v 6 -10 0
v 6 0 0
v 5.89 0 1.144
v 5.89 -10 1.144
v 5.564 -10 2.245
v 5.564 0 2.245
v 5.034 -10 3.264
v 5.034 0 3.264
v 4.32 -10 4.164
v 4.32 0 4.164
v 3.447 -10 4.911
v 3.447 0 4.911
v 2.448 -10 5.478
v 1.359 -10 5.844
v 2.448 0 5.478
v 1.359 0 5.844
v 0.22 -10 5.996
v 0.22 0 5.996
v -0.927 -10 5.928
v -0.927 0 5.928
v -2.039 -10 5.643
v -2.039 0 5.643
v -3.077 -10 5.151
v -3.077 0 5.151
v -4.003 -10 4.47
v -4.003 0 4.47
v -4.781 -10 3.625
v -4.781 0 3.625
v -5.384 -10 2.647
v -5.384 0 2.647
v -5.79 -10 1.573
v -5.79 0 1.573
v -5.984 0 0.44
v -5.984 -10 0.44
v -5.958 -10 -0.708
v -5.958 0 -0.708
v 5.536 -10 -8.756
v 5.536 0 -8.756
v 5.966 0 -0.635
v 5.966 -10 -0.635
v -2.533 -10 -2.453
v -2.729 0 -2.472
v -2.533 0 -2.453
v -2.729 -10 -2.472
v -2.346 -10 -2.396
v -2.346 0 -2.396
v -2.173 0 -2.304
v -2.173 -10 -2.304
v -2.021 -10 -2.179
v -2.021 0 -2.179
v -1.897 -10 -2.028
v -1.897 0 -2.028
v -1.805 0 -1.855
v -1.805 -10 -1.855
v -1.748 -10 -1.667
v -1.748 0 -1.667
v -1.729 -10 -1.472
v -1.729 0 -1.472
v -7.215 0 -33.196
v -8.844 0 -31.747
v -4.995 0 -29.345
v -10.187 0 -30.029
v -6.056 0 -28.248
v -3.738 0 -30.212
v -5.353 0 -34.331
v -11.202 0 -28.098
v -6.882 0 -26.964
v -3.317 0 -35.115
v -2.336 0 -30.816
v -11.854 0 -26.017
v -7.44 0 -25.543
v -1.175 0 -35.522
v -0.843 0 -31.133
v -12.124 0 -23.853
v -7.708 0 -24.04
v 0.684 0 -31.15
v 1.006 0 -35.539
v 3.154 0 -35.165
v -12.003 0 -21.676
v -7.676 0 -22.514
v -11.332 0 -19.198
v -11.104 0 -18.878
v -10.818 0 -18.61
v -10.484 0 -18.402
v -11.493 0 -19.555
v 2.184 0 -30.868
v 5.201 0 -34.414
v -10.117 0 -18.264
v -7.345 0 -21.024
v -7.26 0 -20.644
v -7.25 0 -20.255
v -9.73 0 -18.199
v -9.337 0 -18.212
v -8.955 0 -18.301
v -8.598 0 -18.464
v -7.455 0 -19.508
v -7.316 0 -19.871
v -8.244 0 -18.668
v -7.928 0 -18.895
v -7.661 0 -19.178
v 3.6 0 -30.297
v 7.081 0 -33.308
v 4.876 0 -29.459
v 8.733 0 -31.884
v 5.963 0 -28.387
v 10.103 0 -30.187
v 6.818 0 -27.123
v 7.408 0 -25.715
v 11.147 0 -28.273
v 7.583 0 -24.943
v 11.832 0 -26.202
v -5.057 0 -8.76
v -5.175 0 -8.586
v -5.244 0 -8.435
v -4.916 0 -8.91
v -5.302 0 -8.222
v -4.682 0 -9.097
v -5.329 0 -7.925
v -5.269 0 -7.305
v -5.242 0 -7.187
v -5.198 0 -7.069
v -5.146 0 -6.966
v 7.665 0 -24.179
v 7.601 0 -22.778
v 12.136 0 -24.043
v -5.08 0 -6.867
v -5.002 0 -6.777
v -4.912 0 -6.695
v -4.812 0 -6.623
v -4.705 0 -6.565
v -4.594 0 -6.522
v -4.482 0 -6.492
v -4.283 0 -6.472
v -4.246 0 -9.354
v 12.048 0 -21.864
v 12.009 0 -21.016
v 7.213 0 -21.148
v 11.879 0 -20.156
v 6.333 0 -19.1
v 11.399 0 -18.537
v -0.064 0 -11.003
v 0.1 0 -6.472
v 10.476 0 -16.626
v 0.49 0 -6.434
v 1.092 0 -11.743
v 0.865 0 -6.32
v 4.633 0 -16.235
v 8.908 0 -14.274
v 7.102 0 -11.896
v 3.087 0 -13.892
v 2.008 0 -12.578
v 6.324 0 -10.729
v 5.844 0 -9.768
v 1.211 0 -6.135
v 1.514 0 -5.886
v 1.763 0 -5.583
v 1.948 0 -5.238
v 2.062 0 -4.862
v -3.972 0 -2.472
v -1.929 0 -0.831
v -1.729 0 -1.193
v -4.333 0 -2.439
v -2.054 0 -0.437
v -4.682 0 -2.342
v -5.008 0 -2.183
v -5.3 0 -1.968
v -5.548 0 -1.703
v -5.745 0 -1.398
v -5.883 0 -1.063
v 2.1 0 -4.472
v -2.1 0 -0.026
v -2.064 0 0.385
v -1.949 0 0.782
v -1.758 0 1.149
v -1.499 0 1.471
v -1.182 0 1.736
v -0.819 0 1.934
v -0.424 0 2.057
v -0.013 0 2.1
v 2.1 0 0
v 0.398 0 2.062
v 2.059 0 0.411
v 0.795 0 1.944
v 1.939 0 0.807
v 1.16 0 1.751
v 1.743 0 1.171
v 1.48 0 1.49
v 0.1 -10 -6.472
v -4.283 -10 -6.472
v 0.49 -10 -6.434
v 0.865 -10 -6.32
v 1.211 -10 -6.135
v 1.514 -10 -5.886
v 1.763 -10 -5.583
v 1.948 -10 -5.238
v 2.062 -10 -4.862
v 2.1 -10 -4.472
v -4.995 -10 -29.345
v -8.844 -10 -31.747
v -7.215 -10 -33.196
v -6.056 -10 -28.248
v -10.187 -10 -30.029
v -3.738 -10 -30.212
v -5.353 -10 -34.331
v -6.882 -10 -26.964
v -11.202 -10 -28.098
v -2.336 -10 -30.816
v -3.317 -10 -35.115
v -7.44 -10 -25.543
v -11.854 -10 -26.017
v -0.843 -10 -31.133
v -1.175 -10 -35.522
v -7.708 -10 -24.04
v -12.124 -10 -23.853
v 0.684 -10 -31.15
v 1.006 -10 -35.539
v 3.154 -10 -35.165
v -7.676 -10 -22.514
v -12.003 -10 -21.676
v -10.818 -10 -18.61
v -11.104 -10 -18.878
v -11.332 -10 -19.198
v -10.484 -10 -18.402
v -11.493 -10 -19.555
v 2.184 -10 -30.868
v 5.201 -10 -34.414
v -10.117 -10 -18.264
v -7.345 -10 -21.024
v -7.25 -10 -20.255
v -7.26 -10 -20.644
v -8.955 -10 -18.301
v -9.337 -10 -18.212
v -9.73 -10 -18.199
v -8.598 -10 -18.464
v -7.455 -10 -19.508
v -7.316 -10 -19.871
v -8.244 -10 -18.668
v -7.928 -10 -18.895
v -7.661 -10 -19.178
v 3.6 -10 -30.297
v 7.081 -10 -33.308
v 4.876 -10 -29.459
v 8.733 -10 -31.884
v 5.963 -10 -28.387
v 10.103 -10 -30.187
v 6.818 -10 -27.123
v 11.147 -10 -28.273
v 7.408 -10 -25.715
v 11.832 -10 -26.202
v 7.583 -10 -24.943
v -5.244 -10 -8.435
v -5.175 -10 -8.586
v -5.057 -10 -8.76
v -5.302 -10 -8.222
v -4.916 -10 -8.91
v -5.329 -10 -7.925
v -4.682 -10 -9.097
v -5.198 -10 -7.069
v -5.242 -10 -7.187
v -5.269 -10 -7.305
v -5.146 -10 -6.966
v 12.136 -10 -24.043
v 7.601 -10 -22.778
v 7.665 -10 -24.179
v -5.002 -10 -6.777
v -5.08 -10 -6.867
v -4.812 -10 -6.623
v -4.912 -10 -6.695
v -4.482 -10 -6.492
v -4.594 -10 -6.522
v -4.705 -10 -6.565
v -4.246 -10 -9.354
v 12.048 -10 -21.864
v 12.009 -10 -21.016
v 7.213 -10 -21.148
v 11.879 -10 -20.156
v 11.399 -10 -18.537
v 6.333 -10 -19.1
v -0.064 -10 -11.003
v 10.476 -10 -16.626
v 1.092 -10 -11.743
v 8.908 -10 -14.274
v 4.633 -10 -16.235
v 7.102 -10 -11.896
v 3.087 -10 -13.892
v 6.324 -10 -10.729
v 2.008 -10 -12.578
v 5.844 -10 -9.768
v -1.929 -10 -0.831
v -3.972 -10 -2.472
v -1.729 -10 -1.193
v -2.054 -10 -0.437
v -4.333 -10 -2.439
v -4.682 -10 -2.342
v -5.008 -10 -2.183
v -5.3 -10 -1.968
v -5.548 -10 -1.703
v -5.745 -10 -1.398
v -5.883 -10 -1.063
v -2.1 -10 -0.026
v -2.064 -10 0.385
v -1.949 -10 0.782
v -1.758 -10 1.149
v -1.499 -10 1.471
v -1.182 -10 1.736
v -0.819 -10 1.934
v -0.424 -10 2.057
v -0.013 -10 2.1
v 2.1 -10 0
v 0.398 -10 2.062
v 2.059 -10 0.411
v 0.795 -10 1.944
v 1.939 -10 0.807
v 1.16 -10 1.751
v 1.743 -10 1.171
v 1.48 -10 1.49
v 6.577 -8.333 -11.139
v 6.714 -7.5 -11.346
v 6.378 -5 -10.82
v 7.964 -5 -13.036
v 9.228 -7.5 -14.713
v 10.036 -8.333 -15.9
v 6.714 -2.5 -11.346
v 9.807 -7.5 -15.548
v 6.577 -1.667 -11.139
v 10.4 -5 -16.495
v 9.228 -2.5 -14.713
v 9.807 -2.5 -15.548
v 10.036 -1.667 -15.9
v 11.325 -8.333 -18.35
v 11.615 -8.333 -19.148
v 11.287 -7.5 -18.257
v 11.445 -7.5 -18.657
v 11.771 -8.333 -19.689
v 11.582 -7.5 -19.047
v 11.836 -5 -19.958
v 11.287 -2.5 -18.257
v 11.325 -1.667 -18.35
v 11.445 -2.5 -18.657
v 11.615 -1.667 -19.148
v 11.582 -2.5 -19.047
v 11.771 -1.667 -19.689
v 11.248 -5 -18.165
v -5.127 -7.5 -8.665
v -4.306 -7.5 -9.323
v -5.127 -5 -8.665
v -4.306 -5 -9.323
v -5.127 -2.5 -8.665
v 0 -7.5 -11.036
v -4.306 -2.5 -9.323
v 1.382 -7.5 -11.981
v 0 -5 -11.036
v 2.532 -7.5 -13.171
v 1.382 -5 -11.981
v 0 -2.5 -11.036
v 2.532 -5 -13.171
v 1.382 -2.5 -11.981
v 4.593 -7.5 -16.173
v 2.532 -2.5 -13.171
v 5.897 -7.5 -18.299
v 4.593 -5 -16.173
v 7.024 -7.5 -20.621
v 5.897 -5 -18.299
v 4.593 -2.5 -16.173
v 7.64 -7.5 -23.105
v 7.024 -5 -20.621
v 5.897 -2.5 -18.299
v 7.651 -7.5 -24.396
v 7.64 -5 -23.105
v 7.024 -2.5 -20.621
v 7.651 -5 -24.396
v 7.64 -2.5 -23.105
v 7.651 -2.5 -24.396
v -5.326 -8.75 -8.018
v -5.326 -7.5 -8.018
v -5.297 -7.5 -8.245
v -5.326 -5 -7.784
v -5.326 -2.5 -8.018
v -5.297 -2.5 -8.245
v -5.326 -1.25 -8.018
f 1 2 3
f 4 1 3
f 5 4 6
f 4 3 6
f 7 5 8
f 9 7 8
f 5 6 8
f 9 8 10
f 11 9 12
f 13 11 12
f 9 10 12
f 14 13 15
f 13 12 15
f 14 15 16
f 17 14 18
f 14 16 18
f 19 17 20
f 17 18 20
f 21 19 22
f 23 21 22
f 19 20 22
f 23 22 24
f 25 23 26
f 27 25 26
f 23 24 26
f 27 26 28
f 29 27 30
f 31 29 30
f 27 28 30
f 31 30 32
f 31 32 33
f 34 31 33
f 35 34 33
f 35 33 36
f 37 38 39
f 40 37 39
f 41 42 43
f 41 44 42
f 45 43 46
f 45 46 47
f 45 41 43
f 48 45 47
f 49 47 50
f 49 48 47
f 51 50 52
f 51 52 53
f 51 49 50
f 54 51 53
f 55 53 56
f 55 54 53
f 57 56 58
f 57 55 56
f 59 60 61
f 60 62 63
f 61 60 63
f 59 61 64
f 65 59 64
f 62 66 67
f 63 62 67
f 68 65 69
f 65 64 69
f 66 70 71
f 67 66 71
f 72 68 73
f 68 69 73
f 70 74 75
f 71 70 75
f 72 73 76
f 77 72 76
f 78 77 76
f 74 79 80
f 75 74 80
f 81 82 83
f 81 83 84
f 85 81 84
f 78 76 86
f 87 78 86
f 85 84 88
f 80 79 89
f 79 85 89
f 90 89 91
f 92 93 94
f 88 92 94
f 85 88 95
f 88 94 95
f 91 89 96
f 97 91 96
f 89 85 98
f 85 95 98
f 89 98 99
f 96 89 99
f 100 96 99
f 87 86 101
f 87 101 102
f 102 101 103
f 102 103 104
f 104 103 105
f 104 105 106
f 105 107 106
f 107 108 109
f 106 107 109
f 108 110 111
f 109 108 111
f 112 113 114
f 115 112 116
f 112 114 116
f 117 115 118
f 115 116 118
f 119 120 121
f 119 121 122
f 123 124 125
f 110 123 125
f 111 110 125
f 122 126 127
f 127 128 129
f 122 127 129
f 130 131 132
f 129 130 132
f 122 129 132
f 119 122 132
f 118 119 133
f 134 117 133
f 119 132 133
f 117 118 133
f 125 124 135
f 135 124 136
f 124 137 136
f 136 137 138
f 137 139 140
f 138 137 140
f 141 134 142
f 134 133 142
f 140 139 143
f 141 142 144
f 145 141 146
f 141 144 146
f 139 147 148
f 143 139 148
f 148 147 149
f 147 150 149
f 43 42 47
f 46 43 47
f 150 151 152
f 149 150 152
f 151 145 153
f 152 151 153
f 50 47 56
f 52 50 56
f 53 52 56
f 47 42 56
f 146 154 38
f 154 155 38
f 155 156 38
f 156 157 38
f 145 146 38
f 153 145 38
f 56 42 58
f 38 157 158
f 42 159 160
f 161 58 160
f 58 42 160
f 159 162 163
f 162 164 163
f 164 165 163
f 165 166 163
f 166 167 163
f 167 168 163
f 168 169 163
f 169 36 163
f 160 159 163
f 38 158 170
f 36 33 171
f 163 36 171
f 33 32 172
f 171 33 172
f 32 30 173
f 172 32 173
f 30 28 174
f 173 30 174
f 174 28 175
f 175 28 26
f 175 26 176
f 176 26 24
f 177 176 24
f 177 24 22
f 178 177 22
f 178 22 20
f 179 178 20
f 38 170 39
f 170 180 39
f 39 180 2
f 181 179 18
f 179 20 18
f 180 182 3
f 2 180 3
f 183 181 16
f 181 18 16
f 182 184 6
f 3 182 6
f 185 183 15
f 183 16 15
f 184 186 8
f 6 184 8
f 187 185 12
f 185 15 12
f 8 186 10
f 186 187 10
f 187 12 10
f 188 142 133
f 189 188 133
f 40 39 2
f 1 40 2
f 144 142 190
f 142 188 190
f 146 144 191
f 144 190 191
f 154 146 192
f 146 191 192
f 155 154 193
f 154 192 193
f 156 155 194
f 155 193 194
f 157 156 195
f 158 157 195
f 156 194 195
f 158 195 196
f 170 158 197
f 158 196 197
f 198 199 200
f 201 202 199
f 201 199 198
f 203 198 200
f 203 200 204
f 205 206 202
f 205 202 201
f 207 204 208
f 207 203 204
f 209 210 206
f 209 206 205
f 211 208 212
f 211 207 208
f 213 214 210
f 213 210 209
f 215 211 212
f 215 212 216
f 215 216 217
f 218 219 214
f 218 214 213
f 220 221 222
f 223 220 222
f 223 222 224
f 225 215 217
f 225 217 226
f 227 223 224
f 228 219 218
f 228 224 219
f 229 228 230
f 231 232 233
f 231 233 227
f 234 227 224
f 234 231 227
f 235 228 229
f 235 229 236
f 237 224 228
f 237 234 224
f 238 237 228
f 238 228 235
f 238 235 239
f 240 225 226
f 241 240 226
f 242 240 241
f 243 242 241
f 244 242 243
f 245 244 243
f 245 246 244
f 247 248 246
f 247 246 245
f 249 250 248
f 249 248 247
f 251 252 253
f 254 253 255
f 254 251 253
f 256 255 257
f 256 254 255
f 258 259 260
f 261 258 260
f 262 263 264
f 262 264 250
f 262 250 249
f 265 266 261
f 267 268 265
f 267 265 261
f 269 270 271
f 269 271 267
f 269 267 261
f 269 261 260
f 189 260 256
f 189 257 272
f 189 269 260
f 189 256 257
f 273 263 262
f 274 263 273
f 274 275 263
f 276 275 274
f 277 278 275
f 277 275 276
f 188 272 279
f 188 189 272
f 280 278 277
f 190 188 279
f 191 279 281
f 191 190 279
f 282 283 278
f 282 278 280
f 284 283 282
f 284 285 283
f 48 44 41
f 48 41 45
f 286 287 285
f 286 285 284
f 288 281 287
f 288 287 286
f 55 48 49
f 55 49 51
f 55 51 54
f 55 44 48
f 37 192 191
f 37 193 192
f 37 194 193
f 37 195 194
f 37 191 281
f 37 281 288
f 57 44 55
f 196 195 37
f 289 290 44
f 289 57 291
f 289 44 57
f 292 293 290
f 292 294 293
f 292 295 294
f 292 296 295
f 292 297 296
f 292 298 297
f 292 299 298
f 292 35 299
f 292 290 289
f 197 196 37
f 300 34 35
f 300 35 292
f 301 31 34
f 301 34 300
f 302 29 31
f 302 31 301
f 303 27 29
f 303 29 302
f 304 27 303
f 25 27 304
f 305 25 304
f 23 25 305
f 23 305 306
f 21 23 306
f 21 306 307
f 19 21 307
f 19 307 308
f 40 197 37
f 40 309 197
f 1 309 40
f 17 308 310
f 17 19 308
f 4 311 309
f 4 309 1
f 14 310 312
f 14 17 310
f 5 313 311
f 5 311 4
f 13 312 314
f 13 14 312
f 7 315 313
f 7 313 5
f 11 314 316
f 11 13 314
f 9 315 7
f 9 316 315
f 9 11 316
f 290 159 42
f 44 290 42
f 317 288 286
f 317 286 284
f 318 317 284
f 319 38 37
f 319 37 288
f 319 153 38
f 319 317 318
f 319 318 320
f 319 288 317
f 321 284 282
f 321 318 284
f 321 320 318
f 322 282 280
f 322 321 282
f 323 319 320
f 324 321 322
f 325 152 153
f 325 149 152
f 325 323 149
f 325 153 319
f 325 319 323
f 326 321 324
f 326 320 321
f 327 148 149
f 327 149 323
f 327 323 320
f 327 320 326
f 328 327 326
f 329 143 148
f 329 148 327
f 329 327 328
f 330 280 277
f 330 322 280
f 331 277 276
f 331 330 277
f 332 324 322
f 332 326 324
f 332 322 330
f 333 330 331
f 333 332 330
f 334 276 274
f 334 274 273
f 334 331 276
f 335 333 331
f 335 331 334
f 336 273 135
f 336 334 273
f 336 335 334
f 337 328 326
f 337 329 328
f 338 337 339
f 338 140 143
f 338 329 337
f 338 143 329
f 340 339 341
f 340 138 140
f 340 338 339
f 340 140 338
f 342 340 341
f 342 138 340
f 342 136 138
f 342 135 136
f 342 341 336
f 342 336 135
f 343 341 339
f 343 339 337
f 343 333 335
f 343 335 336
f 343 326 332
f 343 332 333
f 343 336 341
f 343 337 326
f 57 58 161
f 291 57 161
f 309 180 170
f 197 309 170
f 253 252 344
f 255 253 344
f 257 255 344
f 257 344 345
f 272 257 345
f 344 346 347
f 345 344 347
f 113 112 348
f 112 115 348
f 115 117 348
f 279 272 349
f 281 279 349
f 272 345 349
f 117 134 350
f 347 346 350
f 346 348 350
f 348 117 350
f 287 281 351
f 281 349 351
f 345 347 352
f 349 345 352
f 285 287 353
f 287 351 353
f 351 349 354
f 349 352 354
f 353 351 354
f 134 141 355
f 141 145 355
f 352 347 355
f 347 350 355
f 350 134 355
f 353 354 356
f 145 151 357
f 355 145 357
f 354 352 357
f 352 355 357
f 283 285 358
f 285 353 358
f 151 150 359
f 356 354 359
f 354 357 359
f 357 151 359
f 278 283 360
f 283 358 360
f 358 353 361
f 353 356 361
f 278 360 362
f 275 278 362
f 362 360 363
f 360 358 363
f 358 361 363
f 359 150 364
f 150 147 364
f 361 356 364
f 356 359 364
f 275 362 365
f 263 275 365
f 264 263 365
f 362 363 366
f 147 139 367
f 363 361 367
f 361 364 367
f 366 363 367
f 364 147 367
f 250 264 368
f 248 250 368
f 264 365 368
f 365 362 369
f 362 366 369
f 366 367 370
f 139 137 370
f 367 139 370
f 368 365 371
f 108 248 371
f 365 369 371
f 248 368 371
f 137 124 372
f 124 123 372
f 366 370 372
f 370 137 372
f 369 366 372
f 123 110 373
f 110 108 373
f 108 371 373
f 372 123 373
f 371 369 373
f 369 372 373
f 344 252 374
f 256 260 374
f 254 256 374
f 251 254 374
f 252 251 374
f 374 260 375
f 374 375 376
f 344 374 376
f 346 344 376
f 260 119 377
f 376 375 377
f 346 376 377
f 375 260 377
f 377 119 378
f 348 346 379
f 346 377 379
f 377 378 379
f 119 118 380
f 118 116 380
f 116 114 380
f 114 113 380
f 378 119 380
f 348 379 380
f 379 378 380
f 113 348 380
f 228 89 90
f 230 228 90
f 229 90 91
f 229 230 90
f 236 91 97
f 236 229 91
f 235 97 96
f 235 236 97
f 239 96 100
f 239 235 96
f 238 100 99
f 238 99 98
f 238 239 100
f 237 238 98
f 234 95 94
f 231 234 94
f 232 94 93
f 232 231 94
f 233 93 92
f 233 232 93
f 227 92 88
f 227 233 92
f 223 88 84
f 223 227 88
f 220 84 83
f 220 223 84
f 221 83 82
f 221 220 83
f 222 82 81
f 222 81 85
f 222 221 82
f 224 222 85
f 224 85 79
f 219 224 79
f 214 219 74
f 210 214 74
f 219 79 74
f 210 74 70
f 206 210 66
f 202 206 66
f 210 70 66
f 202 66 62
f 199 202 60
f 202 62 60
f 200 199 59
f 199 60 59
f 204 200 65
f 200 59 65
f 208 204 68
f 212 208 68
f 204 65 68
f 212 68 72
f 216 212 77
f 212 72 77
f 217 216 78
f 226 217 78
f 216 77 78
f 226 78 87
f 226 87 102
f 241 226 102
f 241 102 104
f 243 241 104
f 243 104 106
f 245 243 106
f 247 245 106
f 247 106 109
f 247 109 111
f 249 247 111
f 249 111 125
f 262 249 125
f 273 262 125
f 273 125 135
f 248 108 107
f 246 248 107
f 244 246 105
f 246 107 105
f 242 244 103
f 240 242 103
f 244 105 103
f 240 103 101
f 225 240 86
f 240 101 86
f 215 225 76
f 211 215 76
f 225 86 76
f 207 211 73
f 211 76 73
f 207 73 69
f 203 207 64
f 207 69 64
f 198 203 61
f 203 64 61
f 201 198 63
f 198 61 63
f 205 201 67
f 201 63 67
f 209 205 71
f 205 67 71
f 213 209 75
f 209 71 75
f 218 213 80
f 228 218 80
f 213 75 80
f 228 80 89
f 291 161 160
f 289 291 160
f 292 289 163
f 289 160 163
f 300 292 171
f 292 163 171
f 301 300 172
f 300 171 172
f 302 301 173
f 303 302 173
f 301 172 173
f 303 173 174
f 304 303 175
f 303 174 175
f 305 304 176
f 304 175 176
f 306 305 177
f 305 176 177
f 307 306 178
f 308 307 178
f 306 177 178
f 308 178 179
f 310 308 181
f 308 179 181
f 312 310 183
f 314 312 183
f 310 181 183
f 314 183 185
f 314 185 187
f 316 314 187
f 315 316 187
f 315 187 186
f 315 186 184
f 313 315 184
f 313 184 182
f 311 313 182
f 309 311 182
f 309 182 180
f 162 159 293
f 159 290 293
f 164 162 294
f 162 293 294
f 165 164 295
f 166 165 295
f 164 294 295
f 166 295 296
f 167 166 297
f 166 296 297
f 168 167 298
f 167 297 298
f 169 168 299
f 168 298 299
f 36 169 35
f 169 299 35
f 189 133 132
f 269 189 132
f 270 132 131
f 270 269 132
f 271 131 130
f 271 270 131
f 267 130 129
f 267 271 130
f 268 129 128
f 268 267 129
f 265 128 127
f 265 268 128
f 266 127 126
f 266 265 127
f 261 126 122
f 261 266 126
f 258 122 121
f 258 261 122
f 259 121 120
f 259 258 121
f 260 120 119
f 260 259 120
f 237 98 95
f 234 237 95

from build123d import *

# Parameters (mm, degrees)
F1_DEPTH = 10
F2_R     = 1
F3_R     = 2


# Not quite as in the source:
# - two fillets or chamfers of one size are made in one step
# - a feature names something its author has since deleted; it is built from what else it names


with BuildPart() as f1:
    # F0 (on Front) → F1 (new body)
    with BuildSketch(Plane.XZ):
        with BuildLine():
            ThreePointArc((-1.7285399627, -1.1925391387), (-0.6245262518, 2.0049855263), (2.1, 0))
            Line((2.1, 0), (2.1, -6.4722087772))
            Line((2.1, -6.4722087772), (-1.7285399627, -6.4722087772))
            Line((-1.7285399627, -6.4722087772), (-5.1270676777, -6.4722087772))
            add(Edge.make_bspline(
                [(-5.1270676777, -6.4722087772), (-5.2022797508, -7.1671189286), (-6.0866195882, -9.4345123751), (1.027351741, -10.4770430063), (4.526556097, -16.11453384), (8.4301587847, -22.1647756383), (7.4084669429, -25.7151645559)],
                knots=[0, 0, 0, 0, 0.1536701078, 0.4002962667, 0.6726958228, 1, 1, 1, 1], degree=3))
            ThreePointArc((7.4084669429, -25.7151645559), (-3.085024735, -30.5342112997), (-6.6922515438, -19.5649590981))
            Line((-6.6922515438, -19.5649590981), (-10.5016801666, -17.3630853307))
            ThreePointArc((-10.5016801666, -17.3630853307), (-2.3664943525, -35.3449464187), (12.0481319901, -21.8635843278))
            add(Edge.make_bspline(
                [(5.535574435, -8.7558477202), (5.8434484166, -10.2656725536), (7.9936891439, -13.1024488577), (12.074048333, -18.3231807373), (12.0481319901, -21.8635843278)],
                knots=[0, 0, 0, 0, 0.4156437378, 1, 1, 1, 1], degree=3))
            Line((5.535574435, -8.7558477202), (5.9663335796, -0.6347153824))
            Line((5.9663335796, -0.6347153824), (6, 0))
            ThreePointArc((6, 0), (-1.2645054368, 5.8652387846), (-5.4670086667, -2.4722087772))
            Line((-5.4670086667, -2.4722087772), (-1.7285399627, -2.4722087772))
            Line((-1.7285399627, -2.4722087772), (-1.7285399627, -1.1925391387))
        make_face()
    extrude(amount=F1_DEPTH)

    # F2
    f2_edges = [f1.edges().sort_by_distance(p)[0] for p in [
        (-1.72854, -5, -2.472209),
        (-5.127068, -5, -6.472209),
    ]]
    fillet(f2_edges, radius=F2_R)

    # F3
    f3_edges = [f1.edges().sort_by_distance(p)[0] for p in [
        (-10.50168, -5, -17.363085),
        (-6.692252, -5, -19.564959),
        (-5.467009, -5, -2.472209),
        (2.1, -5, -6.472209),
    ]]
    fillet(f3_edges, radius=F3_R)


solid = f1.part
